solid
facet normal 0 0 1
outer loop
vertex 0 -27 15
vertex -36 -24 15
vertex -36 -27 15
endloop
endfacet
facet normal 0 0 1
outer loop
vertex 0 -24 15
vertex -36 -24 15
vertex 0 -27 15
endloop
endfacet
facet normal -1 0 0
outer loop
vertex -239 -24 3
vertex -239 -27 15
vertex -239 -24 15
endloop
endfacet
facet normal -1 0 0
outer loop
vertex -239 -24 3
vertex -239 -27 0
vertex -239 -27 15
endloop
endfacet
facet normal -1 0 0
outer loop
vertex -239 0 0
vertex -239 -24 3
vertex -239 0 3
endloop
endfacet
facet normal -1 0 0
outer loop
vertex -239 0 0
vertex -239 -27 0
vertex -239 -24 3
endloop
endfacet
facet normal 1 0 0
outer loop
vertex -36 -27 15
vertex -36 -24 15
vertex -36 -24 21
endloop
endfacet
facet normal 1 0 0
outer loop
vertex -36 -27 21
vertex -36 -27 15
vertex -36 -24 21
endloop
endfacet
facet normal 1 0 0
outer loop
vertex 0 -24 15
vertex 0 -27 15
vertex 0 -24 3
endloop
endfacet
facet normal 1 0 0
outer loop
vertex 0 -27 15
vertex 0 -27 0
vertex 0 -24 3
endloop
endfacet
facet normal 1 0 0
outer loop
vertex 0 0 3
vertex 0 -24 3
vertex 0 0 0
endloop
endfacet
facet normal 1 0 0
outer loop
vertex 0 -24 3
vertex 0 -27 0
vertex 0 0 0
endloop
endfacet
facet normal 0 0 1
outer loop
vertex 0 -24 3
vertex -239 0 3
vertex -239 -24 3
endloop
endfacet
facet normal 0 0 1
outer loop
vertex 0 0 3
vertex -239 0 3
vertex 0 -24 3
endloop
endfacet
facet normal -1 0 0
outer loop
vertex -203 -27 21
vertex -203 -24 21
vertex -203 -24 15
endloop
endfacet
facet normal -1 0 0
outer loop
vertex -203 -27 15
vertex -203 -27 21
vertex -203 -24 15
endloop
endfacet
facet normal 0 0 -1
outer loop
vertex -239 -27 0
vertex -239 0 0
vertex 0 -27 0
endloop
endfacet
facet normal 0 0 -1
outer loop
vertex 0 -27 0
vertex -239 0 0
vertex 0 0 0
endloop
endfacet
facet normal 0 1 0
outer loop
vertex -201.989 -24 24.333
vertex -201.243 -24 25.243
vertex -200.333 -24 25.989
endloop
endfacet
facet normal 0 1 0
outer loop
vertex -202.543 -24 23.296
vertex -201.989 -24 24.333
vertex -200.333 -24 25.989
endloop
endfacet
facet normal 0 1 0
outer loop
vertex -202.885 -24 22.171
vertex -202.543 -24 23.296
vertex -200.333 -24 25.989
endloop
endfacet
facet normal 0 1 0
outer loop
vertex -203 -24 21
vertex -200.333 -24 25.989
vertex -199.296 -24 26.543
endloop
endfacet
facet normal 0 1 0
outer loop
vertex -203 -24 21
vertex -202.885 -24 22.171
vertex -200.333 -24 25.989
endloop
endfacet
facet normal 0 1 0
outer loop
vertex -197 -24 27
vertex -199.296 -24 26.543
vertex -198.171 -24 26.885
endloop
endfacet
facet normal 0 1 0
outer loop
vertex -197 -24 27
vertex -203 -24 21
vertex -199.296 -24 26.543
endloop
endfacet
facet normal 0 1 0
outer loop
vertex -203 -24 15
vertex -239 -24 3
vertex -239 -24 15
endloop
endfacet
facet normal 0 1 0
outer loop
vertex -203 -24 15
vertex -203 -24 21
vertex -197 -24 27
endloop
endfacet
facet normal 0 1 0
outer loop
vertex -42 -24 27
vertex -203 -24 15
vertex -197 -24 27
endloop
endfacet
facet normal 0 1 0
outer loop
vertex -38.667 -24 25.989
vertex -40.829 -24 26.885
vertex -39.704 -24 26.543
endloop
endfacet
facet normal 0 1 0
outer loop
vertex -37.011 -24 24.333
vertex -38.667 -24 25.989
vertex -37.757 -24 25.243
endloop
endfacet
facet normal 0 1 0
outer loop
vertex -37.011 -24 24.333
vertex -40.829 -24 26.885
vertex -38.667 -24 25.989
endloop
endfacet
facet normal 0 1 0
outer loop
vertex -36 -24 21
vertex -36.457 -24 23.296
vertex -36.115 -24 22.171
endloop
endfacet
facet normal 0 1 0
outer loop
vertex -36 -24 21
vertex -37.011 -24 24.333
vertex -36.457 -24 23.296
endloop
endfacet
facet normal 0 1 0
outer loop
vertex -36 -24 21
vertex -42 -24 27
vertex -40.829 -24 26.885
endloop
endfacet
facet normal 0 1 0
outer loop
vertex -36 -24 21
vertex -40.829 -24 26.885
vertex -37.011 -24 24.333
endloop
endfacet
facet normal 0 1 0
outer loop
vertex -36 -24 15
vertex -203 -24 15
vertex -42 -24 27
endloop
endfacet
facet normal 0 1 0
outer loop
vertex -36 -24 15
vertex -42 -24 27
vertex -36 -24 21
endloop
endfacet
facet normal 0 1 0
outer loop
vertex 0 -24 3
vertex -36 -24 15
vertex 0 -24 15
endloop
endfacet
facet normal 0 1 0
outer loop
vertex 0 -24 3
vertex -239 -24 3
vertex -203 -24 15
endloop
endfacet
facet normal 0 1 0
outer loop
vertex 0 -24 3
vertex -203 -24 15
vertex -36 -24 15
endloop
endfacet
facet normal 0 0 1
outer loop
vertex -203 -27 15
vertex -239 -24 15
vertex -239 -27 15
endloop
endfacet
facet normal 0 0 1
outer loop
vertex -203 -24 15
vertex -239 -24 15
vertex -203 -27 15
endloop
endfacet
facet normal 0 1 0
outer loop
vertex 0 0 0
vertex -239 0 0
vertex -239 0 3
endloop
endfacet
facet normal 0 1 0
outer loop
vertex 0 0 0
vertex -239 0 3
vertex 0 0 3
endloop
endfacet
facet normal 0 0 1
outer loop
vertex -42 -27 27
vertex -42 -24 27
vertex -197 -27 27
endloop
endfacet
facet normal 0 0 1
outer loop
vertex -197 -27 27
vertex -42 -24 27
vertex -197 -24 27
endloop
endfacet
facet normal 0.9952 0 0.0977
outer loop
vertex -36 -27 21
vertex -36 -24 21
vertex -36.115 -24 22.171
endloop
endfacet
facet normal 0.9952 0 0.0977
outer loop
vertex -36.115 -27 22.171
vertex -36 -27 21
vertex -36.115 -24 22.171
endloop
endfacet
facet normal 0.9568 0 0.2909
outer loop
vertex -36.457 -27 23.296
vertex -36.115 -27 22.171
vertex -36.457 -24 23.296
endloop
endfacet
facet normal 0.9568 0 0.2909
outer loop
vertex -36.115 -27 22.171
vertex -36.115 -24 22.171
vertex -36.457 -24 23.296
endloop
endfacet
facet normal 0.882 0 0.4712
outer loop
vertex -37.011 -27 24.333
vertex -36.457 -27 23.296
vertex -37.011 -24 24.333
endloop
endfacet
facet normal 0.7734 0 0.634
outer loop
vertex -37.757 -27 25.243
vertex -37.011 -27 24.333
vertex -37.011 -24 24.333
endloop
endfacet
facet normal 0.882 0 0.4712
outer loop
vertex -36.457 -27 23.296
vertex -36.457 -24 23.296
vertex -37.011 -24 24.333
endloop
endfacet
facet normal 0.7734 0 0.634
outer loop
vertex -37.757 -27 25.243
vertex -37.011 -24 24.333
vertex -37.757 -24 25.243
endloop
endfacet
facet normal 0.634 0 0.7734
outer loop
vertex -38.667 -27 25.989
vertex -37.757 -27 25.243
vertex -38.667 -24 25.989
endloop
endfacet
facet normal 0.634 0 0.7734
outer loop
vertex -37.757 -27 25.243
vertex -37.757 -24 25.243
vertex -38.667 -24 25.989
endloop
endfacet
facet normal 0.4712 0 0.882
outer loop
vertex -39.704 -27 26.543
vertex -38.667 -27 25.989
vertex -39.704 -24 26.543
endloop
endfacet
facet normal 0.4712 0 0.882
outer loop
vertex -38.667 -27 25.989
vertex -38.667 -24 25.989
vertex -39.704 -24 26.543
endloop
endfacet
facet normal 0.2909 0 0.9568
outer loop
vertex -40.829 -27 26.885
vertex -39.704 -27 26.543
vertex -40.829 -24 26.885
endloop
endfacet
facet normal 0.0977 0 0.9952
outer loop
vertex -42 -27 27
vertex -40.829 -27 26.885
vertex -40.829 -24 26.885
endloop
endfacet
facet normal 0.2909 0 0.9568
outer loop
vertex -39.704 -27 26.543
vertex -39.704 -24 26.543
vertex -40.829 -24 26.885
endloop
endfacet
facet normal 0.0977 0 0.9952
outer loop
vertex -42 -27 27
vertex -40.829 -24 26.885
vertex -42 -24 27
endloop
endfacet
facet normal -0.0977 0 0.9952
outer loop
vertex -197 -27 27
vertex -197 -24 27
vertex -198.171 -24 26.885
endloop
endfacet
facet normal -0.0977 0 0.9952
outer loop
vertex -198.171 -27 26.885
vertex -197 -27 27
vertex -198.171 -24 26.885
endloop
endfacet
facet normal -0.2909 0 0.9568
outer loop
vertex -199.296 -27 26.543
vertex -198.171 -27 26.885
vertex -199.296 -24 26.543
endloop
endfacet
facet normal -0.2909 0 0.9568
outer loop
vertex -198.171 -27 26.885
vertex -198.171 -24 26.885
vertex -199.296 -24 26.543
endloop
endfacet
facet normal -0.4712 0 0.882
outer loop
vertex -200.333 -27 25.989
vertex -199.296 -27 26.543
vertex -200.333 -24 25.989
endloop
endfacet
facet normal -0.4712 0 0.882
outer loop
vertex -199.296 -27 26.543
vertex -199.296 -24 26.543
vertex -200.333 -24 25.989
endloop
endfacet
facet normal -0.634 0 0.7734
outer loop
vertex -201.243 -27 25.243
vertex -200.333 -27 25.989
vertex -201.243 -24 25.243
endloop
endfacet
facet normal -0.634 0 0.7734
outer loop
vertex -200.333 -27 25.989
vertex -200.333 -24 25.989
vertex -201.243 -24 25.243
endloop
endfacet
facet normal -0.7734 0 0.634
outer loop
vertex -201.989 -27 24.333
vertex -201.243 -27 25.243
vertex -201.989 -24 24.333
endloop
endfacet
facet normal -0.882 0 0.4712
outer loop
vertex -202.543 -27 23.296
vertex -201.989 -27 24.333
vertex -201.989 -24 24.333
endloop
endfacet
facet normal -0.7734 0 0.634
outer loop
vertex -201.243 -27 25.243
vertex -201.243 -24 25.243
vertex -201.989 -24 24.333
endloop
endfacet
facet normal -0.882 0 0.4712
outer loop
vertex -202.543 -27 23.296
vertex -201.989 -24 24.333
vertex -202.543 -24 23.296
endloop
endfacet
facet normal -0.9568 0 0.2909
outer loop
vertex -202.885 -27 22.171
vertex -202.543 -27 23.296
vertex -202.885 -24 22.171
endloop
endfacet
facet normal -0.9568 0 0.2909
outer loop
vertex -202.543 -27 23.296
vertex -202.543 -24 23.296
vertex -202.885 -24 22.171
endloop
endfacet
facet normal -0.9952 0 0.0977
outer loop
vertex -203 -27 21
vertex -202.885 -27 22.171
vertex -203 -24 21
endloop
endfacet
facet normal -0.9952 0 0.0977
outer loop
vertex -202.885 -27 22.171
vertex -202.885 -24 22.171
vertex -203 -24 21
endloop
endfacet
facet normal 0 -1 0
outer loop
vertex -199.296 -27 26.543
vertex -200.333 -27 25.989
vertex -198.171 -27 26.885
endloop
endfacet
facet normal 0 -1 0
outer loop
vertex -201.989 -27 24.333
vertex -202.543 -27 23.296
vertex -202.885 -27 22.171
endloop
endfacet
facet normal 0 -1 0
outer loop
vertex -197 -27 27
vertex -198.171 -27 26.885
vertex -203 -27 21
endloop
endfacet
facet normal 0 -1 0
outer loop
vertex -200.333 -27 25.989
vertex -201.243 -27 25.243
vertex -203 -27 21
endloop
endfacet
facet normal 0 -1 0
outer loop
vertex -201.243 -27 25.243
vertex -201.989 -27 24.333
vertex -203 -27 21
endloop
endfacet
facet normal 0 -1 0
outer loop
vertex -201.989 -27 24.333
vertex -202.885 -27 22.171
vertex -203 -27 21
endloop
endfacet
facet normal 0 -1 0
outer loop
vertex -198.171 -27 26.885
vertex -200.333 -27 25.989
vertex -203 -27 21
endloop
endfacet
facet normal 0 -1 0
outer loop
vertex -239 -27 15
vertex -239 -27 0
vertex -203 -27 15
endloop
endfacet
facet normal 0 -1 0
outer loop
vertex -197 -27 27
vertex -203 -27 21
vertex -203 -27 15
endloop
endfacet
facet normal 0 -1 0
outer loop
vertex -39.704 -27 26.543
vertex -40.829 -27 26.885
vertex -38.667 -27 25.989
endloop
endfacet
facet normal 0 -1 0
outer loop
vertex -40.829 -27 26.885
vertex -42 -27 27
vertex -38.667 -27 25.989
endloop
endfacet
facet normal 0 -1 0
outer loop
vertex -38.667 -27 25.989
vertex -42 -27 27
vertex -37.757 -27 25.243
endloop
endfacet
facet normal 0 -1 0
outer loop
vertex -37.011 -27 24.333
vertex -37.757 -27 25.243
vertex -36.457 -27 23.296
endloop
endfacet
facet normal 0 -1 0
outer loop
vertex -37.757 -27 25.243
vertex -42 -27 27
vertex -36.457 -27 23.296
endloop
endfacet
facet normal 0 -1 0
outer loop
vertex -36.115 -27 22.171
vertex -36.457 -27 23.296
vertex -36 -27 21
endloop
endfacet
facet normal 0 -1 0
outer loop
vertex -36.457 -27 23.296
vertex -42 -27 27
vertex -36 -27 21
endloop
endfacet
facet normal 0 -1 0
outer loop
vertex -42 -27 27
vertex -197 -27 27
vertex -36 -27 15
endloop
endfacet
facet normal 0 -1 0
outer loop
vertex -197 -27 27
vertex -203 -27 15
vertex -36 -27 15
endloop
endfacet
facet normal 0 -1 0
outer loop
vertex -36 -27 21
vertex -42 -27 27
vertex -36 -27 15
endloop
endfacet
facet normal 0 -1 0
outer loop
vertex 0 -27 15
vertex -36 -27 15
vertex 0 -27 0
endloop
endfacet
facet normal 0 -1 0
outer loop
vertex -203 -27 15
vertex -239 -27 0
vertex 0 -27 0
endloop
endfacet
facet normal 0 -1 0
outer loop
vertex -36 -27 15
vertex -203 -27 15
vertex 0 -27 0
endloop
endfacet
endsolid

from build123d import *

# Parameters (mm, degrees)
SKETCH2_W           = 239
SKETCH2_H           = 27
BOSS_EXTRUDE1_DEPTH = 3
SKETCH3_W           = 239
SKETCH3_H           = 3
BOSS_EXTRUDE2_DEPTH = 12
BOSS_EXTRUDE4_DEPTH = 3


with BuildPart() as part:
    # Sketch2 → Boss-Extrude1 (new body)
    with BuildSketch(Plane.XY):
        with Locations((-119.5, -13.5)):
            Rectangle(SKETCH2_W, SKETCH2_H)
    extrude(amount=BOSS_EXTRUDE1_DEPTH)

    # Sketch3 → Boss-Extrude2 (add)
    with BuildSketch(Plane.XY.offset(3)):
        with Locations((-119.5, -25.5)):
            Rectangle(SKETCH3_W, SKETCH3_H)
    extrude(amount=BOSS_EXTRUDE2_DEPTH)

    # Sketch4 → Boss-Extrude4 (add)
    with BuildSketch(Plane(origin=(0, -24, 0), x_dir=(1, 0, 0), z_dir=(0, 1, 0))):
        with BuildLine():
            Line((-203, -15), (-36, -15))
            Line((-36, -15), (-36, -21))
            ThreePointArc((-36, -21), (-37.757359313, -25.242640687), (-42, -27))
            Line((-42, -27), (-197, -27))
            ThreePointArc((-197, -27), (-201.242640687, -25.242640687), (-203, -21))
            Line((-203, -21), (-203, -15))
        make_face()
    extrude(amount=-BOSS_EXTRUDE4_DEPTH)


solid = part.part
